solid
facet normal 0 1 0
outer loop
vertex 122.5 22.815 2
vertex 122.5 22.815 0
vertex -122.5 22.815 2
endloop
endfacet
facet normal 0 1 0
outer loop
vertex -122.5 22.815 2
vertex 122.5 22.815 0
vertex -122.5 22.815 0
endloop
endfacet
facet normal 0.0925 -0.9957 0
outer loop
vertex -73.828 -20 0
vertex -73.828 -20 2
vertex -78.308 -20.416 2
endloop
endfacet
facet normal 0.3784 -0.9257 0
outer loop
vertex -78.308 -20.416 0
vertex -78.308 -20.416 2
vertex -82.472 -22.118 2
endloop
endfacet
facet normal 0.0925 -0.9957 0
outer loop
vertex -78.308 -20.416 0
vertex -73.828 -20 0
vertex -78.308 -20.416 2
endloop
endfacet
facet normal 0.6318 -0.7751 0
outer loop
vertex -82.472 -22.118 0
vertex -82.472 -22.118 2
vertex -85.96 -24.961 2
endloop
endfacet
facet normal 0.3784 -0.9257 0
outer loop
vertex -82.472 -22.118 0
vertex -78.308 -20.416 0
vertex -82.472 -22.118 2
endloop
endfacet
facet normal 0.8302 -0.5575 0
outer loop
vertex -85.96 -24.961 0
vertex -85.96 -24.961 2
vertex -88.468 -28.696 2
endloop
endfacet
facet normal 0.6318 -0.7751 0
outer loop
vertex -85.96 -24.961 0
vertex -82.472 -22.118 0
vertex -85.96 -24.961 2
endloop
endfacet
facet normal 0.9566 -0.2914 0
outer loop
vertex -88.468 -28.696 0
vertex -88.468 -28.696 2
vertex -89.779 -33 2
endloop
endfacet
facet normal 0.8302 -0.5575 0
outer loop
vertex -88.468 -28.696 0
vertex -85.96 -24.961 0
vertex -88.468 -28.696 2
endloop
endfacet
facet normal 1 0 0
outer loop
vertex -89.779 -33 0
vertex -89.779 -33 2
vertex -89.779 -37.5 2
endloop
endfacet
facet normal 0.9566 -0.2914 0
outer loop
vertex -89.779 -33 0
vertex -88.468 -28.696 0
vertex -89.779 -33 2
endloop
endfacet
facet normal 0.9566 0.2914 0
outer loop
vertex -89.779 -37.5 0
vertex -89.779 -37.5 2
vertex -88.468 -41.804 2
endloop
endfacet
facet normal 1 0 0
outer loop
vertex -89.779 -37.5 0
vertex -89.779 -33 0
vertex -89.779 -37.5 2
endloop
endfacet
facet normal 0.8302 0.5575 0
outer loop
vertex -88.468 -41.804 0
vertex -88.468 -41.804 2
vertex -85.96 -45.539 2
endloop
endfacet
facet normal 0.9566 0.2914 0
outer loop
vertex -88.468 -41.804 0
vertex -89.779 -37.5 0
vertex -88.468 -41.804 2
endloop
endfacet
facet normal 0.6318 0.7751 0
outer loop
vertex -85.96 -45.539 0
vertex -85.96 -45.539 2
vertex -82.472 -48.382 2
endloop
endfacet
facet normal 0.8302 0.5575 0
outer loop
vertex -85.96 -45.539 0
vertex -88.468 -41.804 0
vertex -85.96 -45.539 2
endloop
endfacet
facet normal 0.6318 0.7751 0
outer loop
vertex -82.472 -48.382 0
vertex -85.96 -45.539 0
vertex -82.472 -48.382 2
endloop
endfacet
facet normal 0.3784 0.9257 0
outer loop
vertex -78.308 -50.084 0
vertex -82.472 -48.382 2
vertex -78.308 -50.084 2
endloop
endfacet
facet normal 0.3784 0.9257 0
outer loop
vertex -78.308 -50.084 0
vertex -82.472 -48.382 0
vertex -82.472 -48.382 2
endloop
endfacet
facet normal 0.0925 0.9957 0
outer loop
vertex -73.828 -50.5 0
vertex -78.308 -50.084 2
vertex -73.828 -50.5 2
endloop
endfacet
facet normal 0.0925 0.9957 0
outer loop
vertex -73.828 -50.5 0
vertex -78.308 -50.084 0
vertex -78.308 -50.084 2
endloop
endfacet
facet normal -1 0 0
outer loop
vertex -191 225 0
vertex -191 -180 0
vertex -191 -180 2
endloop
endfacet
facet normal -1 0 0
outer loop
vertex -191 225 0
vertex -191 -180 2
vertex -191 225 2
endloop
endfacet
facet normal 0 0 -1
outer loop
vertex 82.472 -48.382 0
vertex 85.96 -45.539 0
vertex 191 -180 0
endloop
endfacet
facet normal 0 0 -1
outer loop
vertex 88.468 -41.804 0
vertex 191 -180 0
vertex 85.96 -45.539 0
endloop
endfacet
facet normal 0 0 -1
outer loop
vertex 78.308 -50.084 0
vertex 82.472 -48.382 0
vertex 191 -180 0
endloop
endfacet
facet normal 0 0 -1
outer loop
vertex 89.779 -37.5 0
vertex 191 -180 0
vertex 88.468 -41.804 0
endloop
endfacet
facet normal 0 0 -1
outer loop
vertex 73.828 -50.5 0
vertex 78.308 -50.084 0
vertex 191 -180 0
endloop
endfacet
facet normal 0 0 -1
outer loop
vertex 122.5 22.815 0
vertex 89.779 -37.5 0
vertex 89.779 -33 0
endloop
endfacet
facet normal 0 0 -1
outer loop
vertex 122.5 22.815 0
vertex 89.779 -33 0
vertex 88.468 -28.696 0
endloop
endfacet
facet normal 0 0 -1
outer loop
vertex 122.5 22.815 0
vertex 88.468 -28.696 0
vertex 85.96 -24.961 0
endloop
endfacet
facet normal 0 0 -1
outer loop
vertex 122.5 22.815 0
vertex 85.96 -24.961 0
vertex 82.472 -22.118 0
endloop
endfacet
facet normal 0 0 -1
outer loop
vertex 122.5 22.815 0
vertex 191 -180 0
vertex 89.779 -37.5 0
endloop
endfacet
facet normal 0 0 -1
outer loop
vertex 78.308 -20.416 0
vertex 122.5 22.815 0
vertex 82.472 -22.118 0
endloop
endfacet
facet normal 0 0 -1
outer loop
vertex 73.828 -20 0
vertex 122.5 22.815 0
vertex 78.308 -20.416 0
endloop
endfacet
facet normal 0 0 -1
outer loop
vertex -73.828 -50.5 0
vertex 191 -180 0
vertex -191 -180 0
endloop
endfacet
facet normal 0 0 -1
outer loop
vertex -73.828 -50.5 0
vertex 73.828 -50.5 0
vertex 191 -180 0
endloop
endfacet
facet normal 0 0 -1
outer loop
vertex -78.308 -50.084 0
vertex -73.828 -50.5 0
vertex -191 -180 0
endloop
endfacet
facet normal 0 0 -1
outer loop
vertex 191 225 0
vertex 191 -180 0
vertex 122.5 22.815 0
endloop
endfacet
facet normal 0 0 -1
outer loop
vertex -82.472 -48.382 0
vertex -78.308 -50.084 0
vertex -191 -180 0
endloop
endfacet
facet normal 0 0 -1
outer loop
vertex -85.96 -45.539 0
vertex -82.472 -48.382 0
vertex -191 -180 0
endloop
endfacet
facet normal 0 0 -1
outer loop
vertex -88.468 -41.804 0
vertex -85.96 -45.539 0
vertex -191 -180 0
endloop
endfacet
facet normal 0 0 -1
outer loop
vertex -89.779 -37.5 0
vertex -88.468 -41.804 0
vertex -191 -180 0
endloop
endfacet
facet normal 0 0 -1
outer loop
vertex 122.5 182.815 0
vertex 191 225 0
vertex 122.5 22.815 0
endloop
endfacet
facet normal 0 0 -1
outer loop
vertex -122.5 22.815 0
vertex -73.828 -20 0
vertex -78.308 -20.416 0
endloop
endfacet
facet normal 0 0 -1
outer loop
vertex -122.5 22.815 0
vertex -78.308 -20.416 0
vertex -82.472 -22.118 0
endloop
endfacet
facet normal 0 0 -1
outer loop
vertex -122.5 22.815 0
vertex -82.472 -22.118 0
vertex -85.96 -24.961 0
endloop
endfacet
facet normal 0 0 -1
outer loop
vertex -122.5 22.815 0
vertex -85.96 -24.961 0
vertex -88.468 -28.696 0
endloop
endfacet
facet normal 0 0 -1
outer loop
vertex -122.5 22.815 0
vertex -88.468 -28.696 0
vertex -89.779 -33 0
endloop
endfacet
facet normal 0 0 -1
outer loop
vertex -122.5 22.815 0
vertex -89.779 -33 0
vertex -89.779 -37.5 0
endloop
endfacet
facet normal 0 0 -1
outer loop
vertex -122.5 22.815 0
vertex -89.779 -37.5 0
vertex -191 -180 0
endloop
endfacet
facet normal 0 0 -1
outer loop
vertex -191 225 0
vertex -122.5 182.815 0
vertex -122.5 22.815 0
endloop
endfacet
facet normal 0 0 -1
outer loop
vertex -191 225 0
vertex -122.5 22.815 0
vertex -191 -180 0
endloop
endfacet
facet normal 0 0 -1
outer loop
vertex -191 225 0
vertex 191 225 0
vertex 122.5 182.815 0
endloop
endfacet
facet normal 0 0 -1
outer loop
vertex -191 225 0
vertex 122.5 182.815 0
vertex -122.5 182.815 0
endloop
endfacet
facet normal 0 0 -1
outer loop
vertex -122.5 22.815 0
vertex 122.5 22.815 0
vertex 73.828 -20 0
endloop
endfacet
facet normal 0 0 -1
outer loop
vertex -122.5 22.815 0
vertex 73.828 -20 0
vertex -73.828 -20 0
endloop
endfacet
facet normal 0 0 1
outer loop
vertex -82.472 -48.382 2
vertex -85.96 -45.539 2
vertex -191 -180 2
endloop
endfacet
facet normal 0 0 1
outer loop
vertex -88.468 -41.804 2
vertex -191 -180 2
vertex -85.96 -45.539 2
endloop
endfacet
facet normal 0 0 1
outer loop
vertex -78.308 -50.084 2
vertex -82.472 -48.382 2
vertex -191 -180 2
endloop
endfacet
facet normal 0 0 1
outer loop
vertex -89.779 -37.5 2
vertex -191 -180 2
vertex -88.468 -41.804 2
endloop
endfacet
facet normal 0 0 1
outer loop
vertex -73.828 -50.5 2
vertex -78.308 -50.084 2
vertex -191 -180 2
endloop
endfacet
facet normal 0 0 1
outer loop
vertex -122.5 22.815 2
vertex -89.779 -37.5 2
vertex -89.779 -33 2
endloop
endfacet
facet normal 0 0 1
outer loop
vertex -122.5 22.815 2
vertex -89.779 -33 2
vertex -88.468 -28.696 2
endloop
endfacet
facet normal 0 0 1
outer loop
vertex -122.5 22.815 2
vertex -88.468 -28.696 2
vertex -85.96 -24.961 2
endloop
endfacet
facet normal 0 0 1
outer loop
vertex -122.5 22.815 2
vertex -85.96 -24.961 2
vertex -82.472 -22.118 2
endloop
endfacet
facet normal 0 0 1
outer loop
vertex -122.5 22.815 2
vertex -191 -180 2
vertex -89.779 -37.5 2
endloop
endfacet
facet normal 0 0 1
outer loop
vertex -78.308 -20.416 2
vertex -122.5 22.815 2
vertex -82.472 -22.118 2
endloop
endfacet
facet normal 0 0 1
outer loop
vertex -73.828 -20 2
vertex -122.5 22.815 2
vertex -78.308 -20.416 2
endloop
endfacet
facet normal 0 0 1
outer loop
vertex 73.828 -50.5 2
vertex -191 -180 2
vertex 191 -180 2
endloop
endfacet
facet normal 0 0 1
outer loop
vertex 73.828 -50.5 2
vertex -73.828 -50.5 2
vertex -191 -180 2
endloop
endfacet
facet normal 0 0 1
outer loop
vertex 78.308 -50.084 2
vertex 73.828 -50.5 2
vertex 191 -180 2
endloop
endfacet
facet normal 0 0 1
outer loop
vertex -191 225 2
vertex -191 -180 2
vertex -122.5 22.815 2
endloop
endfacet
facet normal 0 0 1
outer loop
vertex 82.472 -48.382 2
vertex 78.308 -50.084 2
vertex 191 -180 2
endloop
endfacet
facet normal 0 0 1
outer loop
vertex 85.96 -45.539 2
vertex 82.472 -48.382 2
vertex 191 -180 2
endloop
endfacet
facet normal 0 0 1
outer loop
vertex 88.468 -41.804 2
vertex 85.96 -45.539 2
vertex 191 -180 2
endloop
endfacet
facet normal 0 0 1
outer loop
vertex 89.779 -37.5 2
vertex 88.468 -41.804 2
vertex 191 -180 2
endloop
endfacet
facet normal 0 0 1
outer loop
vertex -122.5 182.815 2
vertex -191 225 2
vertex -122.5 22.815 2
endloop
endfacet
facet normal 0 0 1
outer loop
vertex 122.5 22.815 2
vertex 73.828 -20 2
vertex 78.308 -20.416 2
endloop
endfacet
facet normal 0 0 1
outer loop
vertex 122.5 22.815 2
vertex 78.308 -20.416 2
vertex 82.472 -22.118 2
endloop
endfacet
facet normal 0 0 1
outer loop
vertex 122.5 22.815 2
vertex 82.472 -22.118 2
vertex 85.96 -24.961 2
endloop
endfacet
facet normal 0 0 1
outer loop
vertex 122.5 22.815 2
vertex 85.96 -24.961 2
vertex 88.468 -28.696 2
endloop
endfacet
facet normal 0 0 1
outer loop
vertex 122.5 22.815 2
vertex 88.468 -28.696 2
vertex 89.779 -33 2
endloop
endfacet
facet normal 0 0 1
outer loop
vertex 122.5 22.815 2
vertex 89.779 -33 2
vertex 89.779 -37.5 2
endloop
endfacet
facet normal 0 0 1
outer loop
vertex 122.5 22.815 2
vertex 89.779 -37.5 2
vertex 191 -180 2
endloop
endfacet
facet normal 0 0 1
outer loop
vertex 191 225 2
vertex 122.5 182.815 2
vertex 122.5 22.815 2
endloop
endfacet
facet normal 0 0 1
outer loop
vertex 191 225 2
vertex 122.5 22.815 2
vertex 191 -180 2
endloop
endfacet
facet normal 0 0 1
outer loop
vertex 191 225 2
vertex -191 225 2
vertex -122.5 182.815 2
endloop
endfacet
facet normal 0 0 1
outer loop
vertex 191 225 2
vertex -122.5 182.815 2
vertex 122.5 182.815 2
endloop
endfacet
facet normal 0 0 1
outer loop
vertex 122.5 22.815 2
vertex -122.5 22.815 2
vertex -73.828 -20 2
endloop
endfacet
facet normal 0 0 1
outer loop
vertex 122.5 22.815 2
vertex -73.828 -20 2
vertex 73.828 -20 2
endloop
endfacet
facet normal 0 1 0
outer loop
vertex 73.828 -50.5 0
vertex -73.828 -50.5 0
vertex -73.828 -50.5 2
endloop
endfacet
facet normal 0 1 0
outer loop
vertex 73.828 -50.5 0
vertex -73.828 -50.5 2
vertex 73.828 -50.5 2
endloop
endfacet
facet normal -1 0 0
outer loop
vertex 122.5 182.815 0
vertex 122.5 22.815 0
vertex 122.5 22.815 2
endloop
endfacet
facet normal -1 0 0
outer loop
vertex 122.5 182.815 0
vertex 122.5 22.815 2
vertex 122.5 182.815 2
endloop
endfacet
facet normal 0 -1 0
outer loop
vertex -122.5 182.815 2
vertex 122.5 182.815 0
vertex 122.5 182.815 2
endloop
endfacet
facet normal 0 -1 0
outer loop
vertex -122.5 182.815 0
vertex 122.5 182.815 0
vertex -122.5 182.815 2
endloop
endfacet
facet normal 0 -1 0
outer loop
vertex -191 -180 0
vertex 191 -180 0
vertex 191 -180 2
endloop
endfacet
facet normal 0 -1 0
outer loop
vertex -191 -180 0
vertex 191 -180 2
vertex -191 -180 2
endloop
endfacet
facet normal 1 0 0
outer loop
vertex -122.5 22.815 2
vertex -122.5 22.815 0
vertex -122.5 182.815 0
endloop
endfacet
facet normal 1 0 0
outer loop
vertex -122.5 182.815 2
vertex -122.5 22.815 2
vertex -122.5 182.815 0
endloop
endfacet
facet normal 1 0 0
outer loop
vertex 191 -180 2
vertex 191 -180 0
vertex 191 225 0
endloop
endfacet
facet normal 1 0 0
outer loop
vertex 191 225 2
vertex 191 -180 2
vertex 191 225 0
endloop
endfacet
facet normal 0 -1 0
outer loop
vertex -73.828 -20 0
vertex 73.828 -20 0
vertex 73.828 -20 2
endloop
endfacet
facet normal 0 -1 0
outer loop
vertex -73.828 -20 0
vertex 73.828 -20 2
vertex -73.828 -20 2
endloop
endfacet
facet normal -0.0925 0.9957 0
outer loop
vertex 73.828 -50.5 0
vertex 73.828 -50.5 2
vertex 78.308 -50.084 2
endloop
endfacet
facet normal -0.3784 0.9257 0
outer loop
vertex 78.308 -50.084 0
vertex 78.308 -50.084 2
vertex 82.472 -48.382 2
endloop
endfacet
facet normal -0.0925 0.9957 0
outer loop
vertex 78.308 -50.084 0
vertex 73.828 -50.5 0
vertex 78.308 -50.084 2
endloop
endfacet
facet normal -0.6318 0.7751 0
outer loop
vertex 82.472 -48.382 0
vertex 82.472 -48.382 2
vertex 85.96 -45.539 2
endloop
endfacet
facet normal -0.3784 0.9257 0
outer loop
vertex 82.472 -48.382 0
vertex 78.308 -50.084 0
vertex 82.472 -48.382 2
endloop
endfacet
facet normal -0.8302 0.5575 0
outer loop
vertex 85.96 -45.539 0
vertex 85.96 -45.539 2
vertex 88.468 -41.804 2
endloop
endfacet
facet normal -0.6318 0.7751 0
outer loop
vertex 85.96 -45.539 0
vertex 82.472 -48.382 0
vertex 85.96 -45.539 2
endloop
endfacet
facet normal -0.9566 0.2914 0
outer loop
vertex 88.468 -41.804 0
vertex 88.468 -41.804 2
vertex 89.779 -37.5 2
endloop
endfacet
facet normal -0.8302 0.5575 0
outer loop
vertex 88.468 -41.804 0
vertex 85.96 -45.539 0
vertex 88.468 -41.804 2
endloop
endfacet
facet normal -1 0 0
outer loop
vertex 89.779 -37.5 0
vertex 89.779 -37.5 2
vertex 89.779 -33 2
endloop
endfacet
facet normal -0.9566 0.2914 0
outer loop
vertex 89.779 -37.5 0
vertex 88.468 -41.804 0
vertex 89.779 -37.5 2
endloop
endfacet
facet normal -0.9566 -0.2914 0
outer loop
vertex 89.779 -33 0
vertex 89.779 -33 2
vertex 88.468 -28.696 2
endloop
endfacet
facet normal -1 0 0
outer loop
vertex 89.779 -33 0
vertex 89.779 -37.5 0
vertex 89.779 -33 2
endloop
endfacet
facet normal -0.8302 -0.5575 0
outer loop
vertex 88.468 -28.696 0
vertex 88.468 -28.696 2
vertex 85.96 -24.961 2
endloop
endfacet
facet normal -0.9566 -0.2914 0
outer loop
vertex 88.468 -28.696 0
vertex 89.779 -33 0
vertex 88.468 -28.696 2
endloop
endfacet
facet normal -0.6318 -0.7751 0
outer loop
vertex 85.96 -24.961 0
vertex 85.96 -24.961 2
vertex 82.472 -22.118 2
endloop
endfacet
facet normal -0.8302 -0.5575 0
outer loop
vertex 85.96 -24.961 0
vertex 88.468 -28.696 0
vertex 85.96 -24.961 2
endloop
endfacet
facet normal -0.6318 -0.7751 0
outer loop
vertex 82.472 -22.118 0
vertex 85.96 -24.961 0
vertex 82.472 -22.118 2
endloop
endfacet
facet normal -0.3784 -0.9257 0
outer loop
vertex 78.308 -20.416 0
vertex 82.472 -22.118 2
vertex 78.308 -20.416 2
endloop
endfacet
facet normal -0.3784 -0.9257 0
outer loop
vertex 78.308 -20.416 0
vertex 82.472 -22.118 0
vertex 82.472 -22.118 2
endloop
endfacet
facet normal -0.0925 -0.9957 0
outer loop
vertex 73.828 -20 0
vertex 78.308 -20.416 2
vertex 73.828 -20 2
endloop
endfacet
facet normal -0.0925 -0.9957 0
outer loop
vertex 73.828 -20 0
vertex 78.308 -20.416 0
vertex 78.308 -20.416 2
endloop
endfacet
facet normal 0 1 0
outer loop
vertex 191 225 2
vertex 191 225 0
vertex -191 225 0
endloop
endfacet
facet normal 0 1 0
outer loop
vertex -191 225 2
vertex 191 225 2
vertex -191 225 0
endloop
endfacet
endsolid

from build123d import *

# Parameters (mm, degrees)
SKETCH1_W           = 382
SKETCH1_H           = 405
BOSS_EXTRUDE1_DEPTH = 2
CUT_EXTRUDE1_DEPTH  = 296.144032635
SKETCH3_W           = 267
SKETCH3_H           = 157
BOSS_EXTRUDE2_DEPTH = 15
SKETCH4_W           = 261
SKETCH4_H           = 151
CUT_EXTRUDE2_DEPTH  = 15
SKETCH5_W           = 245
SKETCH5_H           = 160
CUT_EXTRUDE3_DEPTH  = 296.51818895
SKETCH7_W           = 15
SKETCH7_H           = 157
CUT_EXTRUDE4_DEPTH  = 395.657042985
BOSS_EXTRUDE3_START = -2
BOSS_EXTRUDE3_DEPTH = 2
CUT_EXTRUDE5_DEPTH  = 296.144032635


with BuildPart() as part:
    # Sketch1 → Boss-Extrude1 (new body)
    with BuildSketch(Plane(origin=(0, 0, 0), x_dir=(-1, 0, 0), z_dir=(0, 0, -1))):
        with Locations((0, 22.5)):
            Rectangle(SKETCH1_W, SKETCH1_H)
    extrude(amount=-BOSS_EXTRUDE1_DEPTH)

    # Sketch2 → Cut-Extrude1 (cut, through all)
    with BuildSketch(Plane.XY.offset(2)):
        with BuildLine():
            Line((-75.5, -35.65), (75.482536693, -35.65))
            ThreePointArc((75.482536693, -35.65), (60.004590726, -20), (75.482536693, -4.35))
            Line((75.482536693, -4.35), (-75.5, -4.35))
            ThreePointArc((-75.5, -4.35), (-91.15, -20), (-75.5, -35.65))
        make_face()
    extrude(amount=-CUT_EXTRUDE1_DEPTH, mode=Mode.SUBTRACT)

    # Sketch3 → Boss-Extrude2 (add)
    with BuildSketch(Plane(origin=(0, 0, 0), x_dir=(-1, 0, 0), z_dir=(0, 0, -1))):
        with Locations((-0.610849862, 98.314505171)):
            Rectangle(SKETCH3_W, SKETCH3_H)
    extrude(amount=BOSS_EXTRUDE2_DEPTH)

    # Sketch4 → Cut-Extrude2 (cut)
    with BuildSketch(Plane(origin=(0, 0, -15), x_dir=(-1, 0, 0), z_dir=(0, 0, -1))):
        with Locations((-0.610849862, 98.314505171)):
            Rectangle(SKETCH4_W, SKETCH4_H)
    extrude(amount=-CUT_EXTRUDE2_DEPTH, mode=Mode.SUBTRACT)

    # Sketch5 → Cut-Extrude3 (cut, through all)
    with BuildSketch(Plane(origin=(0, 0, 0), x_dir=(-1, 0, 0), z_dir=(0, 0, -1))):
        with Locations((0, 102.814505171)):
            Rectangle(SKETCH5_W, SKETCH5_H)
    extrude(amount=-CUT_EXTRUDE3_DEPTH, mode=Mode.SUBTRACT)

    # Sketch7 → Cut-Extrude4 (cut, through all)
    with BuildSketch(Plane.ZY.offset(132.889150138)):
        with Locations((-7.5, 98.314505171)):
            Rectangle(SKETCH7_W, SKETCH7_H)
    extrude(amount=-CUT_EXTRUDE4_DEPTH, mode=Mode.SUBTRACT)

    # Sketch9 → Boss-Extrude3 (add)
    with BuildSketch(Plane(origin=(0, 0, 0), x_dir=(-1, 0, 0), z_dir=(0, 0, -1)).offset(BOSS_EXTRUDE3_START)):
        with BuildLine():
            Line((75.5, -35.65), (-75.482536693, -35.65))
            ThreePointArc((-75.482536693, -35.65), (-60.004590726, -20), (-75.482536693, -4.35))
            Line((-75.482536693, -4.35), (75.5, -4.35))
            ThreePointArc((75.5, -4.35), (91.15, -20), (75.5, -35.65))
        make_face()
    extrude(amount=BOSS_EXTRUDE3_DEPTH)

    # Sketch8 → Cut-Extrude5 (cut, through all)
    with BuildSketch(Plane(origin=(0, 0, 0), x_dir=(-1, 0, 0), z_dir=(0, 0, -1))):
        with BuildLine():
            Line((-73.827773505, -20), (73.827773505, -20))
            ThreePointArc((73.827773505, -20), (89.945940018, -35.25), (73.827773505, -50.5))
            Line((73.827773505, -50.5), (-73.827773505, -50.5))
            ThreePointArc((-73.827773505, -50.5), (-89.945940018, -35.25), (-73.827773505, -20))
        make_face()
    extrude(amount=-CUT_EXTRUDE5_DEPTH, mode=Mode.SUBTRACT)


solid = part.part
